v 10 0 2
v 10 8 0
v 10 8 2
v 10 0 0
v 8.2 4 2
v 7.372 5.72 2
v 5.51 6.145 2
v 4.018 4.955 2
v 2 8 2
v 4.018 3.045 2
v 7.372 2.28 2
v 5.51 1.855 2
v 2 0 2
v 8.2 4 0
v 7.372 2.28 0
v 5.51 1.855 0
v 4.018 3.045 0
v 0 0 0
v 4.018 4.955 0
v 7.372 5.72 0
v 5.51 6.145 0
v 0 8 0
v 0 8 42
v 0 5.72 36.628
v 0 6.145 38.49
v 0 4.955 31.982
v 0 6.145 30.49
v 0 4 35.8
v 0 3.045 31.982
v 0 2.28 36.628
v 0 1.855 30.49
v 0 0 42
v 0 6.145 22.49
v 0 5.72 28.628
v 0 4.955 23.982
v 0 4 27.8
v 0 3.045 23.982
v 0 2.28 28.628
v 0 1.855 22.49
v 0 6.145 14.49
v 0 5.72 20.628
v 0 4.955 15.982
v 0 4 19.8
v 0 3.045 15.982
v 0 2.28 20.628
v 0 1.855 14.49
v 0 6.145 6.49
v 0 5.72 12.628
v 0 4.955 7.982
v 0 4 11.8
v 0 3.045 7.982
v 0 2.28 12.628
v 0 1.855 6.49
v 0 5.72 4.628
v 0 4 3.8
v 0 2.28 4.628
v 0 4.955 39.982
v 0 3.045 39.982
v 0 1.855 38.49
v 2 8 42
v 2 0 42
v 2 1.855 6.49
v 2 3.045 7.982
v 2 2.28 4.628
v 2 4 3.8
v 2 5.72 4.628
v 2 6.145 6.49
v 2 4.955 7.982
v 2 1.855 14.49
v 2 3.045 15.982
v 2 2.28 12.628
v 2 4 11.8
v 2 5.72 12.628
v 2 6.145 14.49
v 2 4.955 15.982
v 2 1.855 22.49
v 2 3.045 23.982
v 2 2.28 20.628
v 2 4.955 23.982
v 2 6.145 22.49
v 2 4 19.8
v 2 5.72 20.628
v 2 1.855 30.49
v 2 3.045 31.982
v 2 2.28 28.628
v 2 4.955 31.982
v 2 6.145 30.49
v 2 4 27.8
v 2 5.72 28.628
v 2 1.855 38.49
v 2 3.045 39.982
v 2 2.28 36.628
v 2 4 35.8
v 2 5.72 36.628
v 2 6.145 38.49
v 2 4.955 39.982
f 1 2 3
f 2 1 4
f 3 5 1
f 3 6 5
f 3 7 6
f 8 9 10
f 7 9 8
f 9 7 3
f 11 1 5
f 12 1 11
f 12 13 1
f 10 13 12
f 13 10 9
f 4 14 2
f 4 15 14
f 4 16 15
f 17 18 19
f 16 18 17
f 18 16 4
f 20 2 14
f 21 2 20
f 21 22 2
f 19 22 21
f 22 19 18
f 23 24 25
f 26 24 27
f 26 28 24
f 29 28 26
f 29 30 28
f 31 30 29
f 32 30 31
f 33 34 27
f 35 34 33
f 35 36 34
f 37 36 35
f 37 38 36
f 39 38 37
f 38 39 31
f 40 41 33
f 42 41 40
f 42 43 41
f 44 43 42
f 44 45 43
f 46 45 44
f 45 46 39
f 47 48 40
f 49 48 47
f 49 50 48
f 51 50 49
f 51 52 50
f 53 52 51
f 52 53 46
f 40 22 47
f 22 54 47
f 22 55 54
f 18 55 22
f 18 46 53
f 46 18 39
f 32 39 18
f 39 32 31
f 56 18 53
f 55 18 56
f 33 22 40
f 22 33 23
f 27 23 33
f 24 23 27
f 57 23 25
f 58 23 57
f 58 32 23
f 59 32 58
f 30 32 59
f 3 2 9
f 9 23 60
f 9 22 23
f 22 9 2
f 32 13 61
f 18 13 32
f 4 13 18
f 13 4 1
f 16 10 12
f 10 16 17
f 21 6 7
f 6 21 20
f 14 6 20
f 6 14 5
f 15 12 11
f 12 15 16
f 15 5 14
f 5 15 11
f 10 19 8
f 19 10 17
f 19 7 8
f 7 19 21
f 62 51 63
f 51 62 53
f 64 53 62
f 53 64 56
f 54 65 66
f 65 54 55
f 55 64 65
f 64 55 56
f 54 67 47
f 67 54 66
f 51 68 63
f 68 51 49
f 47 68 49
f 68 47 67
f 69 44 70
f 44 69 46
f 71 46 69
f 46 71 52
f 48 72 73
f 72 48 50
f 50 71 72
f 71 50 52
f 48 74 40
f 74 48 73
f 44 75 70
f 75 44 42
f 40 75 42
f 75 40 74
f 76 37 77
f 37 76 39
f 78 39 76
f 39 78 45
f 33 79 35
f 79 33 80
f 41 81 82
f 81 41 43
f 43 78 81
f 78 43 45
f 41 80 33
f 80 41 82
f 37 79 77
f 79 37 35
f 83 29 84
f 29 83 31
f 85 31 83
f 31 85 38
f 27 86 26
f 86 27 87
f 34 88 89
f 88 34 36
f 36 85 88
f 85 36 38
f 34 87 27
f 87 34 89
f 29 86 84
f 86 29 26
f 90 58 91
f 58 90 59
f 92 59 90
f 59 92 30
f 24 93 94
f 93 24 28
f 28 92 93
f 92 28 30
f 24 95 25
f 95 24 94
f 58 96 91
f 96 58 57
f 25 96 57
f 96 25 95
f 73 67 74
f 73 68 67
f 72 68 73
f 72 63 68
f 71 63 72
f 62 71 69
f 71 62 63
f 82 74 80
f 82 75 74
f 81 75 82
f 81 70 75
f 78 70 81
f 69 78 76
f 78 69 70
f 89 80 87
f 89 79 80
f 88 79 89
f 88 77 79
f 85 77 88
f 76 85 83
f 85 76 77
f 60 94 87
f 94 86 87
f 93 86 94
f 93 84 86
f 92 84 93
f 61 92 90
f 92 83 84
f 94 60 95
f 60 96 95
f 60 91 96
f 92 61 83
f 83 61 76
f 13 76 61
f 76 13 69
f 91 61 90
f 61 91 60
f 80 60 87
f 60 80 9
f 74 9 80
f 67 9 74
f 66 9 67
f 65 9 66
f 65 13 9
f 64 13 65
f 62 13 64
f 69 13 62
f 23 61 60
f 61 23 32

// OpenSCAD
// configuration
width = 1;      // in holes
height = 5;     // in holes
hole = 4;       // diameter in mm
space = 4;      // inter-hole space in mm
pad = space/2;  // in mm

// internal data
h = width*hole + (width - 1)*space + 3*pad;
v = height*hole + (height - 1)*space + 3*pad;
w = hole + 2*pad;

// horizontal pane
difference() {
    cube([h, w, pad]);

    for(i=[1:width]) {
        translate([
            i*hole + (i-1)*space - hole/2 + 2*pad,
            pad + hole/2,
            -pad])
        {
            cylinder(h = pad * 3, r = hole / 2 + 0.2);
        };
    };

};

// vertical pane
difference() {
    cube([pad, w, v]);
    for(i=[1:height]) {
        translate([
            -pad,
            hole/2 + pad,
            i*hole + (i-1)*space - hole/2 + 2*pad
        ]) {
            rotate([0, 90, 0]) {
                cylinder(h = pad * 3, r = hole / 2 + 0.2);
            };
        };
    };
}
